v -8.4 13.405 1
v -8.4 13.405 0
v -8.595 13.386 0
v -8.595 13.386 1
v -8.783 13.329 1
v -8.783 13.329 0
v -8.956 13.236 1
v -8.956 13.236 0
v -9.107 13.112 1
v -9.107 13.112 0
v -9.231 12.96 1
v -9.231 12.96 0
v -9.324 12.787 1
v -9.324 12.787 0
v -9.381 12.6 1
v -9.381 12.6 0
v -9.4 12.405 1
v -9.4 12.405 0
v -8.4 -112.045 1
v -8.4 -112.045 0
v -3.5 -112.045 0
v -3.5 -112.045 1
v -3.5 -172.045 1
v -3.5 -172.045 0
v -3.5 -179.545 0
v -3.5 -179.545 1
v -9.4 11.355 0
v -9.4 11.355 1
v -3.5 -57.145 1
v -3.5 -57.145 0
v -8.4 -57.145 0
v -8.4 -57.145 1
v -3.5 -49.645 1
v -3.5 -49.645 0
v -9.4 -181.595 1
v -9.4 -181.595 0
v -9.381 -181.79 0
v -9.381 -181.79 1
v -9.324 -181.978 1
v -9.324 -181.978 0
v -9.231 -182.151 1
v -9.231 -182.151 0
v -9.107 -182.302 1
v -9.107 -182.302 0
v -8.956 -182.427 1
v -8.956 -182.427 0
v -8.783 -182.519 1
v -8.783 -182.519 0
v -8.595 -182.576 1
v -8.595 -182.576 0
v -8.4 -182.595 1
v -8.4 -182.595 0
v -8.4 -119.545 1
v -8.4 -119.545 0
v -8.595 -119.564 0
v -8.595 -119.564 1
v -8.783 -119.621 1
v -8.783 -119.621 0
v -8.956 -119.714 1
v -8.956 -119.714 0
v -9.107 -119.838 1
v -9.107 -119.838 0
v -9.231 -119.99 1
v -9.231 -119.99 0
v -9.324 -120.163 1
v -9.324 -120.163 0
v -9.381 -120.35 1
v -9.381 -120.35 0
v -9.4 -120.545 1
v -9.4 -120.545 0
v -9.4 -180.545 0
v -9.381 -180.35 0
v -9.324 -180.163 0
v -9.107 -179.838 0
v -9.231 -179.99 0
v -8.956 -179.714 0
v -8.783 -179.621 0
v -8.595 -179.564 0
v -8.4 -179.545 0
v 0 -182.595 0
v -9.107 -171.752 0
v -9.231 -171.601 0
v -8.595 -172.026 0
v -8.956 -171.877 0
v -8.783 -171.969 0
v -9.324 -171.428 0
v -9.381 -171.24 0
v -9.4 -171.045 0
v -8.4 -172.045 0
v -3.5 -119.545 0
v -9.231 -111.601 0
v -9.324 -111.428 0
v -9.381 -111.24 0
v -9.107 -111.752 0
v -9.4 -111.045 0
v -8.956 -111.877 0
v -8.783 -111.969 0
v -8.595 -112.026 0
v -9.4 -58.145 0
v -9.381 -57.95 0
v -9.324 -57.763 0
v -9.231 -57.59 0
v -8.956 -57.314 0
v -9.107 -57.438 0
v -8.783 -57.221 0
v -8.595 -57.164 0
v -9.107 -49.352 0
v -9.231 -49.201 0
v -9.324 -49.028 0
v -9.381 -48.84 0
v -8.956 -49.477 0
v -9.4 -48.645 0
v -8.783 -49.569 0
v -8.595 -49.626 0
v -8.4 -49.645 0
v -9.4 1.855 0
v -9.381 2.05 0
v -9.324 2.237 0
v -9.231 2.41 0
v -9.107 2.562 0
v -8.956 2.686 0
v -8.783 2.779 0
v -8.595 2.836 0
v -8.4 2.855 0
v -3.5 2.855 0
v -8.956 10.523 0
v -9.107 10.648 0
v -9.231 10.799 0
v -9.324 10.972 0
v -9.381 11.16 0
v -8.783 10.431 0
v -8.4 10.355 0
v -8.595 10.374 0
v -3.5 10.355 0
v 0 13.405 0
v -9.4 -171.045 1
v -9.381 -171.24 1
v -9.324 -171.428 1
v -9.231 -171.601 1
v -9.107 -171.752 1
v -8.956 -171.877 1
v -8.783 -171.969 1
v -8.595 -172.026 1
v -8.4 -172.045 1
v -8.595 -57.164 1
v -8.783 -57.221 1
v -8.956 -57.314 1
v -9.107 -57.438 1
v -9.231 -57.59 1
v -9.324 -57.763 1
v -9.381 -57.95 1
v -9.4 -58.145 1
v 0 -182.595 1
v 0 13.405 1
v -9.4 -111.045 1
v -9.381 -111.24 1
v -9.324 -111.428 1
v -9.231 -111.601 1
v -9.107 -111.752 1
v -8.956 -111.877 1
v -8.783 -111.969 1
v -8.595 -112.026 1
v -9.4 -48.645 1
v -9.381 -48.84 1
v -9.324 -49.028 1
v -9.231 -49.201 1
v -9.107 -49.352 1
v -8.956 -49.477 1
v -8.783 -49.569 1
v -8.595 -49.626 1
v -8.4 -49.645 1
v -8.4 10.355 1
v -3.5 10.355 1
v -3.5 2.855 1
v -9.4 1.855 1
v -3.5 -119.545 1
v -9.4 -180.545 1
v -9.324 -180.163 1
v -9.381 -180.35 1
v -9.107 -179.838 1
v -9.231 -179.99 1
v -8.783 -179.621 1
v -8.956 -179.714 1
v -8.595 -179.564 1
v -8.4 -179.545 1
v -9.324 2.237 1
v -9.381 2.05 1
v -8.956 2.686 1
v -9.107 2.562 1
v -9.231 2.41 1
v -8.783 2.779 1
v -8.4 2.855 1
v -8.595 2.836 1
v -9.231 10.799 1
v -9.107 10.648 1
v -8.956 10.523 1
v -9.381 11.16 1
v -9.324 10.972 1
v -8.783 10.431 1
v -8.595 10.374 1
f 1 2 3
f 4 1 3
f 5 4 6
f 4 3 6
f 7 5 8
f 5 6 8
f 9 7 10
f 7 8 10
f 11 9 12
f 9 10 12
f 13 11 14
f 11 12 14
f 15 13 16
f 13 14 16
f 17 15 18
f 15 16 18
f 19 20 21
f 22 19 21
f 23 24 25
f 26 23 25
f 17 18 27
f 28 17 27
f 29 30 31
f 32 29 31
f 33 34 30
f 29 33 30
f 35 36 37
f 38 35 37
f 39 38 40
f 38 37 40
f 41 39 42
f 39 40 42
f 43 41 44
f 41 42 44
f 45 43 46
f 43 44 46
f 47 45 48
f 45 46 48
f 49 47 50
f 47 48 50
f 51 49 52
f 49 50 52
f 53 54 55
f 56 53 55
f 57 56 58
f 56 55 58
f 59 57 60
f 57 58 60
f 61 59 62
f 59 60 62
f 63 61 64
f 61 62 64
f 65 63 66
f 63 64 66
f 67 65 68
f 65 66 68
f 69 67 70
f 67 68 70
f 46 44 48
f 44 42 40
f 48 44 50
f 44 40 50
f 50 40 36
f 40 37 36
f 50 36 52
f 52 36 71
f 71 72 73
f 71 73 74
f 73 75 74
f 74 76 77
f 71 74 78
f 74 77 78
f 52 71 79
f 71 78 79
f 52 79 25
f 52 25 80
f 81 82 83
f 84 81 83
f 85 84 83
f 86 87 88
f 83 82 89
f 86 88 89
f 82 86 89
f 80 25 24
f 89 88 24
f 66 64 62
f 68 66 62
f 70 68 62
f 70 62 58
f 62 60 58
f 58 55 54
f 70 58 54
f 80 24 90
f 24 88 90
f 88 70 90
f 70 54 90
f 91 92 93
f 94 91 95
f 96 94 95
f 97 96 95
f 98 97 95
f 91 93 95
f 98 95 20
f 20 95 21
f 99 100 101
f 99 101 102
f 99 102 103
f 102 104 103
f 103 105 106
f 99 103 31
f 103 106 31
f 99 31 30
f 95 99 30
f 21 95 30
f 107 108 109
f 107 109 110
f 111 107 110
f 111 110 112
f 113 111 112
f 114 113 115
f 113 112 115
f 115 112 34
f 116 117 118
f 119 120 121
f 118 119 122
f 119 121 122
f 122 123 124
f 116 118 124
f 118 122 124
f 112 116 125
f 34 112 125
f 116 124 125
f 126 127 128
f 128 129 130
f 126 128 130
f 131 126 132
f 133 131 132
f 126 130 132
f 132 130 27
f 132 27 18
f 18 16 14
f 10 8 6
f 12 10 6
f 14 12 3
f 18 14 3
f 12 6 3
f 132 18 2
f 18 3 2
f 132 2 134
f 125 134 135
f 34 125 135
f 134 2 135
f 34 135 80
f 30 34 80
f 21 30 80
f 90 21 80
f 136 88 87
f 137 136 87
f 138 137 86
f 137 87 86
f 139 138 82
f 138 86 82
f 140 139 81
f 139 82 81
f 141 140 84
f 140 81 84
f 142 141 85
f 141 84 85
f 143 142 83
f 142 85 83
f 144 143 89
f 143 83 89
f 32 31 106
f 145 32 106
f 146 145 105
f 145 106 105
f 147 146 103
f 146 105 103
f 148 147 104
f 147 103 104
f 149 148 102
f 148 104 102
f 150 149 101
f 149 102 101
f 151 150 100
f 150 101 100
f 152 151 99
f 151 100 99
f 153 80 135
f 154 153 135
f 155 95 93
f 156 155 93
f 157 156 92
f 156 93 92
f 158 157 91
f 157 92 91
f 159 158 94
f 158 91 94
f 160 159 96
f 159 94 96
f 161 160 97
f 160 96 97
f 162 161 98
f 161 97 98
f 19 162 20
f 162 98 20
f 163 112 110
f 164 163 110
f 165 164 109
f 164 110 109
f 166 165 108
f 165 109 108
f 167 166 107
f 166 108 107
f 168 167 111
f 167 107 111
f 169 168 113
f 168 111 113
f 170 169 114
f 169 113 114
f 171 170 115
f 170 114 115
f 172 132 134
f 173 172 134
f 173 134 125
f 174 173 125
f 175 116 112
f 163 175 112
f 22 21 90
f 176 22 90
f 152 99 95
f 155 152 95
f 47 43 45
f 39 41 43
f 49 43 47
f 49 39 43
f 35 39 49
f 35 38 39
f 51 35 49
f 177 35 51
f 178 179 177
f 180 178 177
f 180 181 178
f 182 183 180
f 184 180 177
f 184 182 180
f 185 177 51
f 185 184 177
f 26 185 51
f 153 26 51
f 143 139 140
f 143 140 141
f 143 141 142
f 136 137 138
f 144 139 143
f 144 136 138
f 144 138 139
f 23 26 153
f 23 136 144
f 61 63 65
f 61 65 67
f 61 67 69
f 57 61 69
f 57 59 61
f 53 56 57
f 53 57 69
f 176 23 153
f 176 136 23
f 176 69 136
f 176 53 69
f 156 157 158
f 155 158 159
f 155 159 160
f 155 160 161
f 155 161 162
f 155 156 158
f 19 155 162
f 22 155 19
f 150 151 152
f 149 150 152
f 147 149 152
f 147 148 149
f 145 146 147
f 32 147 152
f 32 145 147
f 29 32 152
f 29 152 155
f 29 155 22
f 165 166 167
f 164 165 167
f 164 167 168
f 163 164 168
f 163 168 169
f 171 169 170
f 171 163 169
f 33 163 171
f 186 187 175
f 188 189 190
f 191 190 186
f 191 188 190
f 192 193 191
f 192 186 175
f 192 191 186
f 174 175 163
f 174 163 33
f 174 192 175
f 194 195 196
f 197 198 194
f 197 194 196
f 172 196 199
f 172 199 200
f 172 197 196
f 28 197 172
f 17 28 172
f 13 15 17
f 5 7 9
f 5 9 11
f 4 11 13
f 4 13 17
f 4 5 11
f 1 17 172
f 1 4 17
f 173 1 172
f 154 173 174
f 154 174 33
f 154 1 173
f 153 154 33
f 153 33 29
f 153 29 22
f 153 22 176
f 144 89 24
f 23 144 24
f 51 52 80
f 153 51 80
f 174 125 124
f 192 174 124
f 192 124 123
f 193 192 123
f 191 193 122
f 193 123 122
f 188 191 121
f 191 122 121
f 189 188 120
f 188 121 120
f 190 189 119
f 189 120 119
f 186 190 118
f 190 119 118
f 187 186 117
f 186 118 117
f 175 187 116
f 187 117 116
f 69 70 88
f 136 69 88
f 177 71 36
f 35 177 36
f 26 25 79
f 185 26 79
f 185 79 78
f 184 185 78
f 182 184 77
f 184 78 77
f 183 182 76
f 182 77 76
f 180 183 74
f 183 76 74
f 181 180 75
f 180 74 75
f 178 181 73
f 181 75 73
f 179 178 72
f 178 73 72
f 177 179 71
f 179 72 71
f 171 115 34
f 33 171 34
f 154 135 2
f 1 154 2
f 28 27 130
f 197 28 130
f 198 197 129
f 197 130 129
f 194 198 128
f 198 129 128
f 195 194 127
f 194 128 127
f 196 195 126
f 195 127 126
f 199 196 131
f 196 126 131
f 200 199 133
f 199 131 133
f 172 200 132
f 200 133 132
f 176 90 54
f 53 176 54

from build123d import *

# Parameters (mm, degrees)
BOSS_EXTRUDE1_DEPTH = 1


with BuildPart() as part:
    # Sketch1 → Boss-Extrude1 (new body)
    with BuildSketch(Plane.XY):
        with BuildLine():
            Line((-4.5, -182.595238095), (0, -182.595238095))
            Line((0, -182.595238095), (0, 13.404761905))
            Line((0, 13.404761905), (-4.5, 13.404761905))
            Line((-4.5, 13.404761905), (-8.4, 13.404761905))
            ThreePointArc((-8.4, 13.404761905), (-9.107106781, 13.111868686), (-9.4, 12.404761905))
            Line((-9.4, 12.404761905), (-9.4, 11.354761905))
            ThreePointArc((-9.4, 11.354761905), (-9.107106781, 10.647655124), (-8.4, 10.354761905))
            Line((-8.4, 10.354761905), (-4.5, 10.354761905))
            Line((-4.5, 10.354761905), (-3.5, 10.354761905))
            Line((-3.5, 10.354761905), (-3.5, 2.854761905))
            Line((-3.5, 2.854761905), (-4.5, 2.854761905))
            Line((-4.5, 2.854761905), (-8.4, 2.854761905))
            ThreePointArc((-8.4, 2.854761905), (-9.107106781, 2.561868686), (-9.4, 1.854761905))
            Line((-9.4, 1.854761905), (-9.4, -48.645238095))
            ThreePointArc((-9.4, -48.645238095), (-9.107106781, -49.352344876), (-8.4, -49.645238095))
            Line((-8.4, -49.645238095), (-4.5, -49.645238095))
            Line((-4.5, -49.645238095), (-3.5, -49.645238095))
            Line((-3.5, -49.645238095), (-3.5, -57.145238095))
            Line((-3.5, -57.145238095), (-4.5, -57.145238095))
            Line((-4.5, -57.145238095), (-8.4, -57.145238095))
            ThreePointArc((-8.4, -57.145238095), (-9.107106781, -57.438131314), (-9.4, -58.145238095))
            Line((-9.4, -58.145238095), (-9.4, -111.045238095))
            ThreePointArc((-9.4, -111.045238095), (-9.107106781, -111.752344876), (-8.4, -112.045238095))
            Line((-8.4, -112.045238095), (-4.5, -112.045238095))
            Line((-4.5, -112.045238095), (-3.5, -112.045238095))
            Line((-3.5, -112.045238095), (-3.5, -119.545238095))
            Line((-3.5, -119.545238095), (-4.5, -119.545238095))
            Line((-4.5, -119.545238095), (-8.4, -119.545238095))
            ThreePointArc((-8.4, -119.545238095), (-9.107106781, -119.838131314), (-9.4, -120.545238095))
            Line((-9.4, -120.545238095), (-9.4, -171.045238095))
            ThreePointArc((-9.4, -171.045238095), (-9.107106781, -171.752344876), (-8.4, -172.045238095))
            Line((-8.4, -172.045238095), (-4.5, -172.045238095))
            Line((-4.5, -172.045238095), (-3.5, -172.045238095))
            Line((-3.5, -172.045238095), (-3.5, -179.545238095))
            Line((-3.5, -179.545238095), (-4.5, -179.545238095))
            Line((-4.5, -179.545238095), (-8.4, -179.545238095))
            ThreePointArc((-8.4, -179.545238095), (-9.107106781, -179.838131314), (-9.4, -180.545238095))
            Line((-9.4, -180.545238095), (-9.4, -181.595238095))
            ThreePointArc((-9.4, -181.595238095), (-9.107106781, -182.302344876), (-8.4, -182.595238095))
            Line((-8.4, -182.595238095), (-4.5, -182.595238095))
        make_face()
    extrude(amount=BOSS_EXTRUDE1_DEPTH)


solid = part.part
